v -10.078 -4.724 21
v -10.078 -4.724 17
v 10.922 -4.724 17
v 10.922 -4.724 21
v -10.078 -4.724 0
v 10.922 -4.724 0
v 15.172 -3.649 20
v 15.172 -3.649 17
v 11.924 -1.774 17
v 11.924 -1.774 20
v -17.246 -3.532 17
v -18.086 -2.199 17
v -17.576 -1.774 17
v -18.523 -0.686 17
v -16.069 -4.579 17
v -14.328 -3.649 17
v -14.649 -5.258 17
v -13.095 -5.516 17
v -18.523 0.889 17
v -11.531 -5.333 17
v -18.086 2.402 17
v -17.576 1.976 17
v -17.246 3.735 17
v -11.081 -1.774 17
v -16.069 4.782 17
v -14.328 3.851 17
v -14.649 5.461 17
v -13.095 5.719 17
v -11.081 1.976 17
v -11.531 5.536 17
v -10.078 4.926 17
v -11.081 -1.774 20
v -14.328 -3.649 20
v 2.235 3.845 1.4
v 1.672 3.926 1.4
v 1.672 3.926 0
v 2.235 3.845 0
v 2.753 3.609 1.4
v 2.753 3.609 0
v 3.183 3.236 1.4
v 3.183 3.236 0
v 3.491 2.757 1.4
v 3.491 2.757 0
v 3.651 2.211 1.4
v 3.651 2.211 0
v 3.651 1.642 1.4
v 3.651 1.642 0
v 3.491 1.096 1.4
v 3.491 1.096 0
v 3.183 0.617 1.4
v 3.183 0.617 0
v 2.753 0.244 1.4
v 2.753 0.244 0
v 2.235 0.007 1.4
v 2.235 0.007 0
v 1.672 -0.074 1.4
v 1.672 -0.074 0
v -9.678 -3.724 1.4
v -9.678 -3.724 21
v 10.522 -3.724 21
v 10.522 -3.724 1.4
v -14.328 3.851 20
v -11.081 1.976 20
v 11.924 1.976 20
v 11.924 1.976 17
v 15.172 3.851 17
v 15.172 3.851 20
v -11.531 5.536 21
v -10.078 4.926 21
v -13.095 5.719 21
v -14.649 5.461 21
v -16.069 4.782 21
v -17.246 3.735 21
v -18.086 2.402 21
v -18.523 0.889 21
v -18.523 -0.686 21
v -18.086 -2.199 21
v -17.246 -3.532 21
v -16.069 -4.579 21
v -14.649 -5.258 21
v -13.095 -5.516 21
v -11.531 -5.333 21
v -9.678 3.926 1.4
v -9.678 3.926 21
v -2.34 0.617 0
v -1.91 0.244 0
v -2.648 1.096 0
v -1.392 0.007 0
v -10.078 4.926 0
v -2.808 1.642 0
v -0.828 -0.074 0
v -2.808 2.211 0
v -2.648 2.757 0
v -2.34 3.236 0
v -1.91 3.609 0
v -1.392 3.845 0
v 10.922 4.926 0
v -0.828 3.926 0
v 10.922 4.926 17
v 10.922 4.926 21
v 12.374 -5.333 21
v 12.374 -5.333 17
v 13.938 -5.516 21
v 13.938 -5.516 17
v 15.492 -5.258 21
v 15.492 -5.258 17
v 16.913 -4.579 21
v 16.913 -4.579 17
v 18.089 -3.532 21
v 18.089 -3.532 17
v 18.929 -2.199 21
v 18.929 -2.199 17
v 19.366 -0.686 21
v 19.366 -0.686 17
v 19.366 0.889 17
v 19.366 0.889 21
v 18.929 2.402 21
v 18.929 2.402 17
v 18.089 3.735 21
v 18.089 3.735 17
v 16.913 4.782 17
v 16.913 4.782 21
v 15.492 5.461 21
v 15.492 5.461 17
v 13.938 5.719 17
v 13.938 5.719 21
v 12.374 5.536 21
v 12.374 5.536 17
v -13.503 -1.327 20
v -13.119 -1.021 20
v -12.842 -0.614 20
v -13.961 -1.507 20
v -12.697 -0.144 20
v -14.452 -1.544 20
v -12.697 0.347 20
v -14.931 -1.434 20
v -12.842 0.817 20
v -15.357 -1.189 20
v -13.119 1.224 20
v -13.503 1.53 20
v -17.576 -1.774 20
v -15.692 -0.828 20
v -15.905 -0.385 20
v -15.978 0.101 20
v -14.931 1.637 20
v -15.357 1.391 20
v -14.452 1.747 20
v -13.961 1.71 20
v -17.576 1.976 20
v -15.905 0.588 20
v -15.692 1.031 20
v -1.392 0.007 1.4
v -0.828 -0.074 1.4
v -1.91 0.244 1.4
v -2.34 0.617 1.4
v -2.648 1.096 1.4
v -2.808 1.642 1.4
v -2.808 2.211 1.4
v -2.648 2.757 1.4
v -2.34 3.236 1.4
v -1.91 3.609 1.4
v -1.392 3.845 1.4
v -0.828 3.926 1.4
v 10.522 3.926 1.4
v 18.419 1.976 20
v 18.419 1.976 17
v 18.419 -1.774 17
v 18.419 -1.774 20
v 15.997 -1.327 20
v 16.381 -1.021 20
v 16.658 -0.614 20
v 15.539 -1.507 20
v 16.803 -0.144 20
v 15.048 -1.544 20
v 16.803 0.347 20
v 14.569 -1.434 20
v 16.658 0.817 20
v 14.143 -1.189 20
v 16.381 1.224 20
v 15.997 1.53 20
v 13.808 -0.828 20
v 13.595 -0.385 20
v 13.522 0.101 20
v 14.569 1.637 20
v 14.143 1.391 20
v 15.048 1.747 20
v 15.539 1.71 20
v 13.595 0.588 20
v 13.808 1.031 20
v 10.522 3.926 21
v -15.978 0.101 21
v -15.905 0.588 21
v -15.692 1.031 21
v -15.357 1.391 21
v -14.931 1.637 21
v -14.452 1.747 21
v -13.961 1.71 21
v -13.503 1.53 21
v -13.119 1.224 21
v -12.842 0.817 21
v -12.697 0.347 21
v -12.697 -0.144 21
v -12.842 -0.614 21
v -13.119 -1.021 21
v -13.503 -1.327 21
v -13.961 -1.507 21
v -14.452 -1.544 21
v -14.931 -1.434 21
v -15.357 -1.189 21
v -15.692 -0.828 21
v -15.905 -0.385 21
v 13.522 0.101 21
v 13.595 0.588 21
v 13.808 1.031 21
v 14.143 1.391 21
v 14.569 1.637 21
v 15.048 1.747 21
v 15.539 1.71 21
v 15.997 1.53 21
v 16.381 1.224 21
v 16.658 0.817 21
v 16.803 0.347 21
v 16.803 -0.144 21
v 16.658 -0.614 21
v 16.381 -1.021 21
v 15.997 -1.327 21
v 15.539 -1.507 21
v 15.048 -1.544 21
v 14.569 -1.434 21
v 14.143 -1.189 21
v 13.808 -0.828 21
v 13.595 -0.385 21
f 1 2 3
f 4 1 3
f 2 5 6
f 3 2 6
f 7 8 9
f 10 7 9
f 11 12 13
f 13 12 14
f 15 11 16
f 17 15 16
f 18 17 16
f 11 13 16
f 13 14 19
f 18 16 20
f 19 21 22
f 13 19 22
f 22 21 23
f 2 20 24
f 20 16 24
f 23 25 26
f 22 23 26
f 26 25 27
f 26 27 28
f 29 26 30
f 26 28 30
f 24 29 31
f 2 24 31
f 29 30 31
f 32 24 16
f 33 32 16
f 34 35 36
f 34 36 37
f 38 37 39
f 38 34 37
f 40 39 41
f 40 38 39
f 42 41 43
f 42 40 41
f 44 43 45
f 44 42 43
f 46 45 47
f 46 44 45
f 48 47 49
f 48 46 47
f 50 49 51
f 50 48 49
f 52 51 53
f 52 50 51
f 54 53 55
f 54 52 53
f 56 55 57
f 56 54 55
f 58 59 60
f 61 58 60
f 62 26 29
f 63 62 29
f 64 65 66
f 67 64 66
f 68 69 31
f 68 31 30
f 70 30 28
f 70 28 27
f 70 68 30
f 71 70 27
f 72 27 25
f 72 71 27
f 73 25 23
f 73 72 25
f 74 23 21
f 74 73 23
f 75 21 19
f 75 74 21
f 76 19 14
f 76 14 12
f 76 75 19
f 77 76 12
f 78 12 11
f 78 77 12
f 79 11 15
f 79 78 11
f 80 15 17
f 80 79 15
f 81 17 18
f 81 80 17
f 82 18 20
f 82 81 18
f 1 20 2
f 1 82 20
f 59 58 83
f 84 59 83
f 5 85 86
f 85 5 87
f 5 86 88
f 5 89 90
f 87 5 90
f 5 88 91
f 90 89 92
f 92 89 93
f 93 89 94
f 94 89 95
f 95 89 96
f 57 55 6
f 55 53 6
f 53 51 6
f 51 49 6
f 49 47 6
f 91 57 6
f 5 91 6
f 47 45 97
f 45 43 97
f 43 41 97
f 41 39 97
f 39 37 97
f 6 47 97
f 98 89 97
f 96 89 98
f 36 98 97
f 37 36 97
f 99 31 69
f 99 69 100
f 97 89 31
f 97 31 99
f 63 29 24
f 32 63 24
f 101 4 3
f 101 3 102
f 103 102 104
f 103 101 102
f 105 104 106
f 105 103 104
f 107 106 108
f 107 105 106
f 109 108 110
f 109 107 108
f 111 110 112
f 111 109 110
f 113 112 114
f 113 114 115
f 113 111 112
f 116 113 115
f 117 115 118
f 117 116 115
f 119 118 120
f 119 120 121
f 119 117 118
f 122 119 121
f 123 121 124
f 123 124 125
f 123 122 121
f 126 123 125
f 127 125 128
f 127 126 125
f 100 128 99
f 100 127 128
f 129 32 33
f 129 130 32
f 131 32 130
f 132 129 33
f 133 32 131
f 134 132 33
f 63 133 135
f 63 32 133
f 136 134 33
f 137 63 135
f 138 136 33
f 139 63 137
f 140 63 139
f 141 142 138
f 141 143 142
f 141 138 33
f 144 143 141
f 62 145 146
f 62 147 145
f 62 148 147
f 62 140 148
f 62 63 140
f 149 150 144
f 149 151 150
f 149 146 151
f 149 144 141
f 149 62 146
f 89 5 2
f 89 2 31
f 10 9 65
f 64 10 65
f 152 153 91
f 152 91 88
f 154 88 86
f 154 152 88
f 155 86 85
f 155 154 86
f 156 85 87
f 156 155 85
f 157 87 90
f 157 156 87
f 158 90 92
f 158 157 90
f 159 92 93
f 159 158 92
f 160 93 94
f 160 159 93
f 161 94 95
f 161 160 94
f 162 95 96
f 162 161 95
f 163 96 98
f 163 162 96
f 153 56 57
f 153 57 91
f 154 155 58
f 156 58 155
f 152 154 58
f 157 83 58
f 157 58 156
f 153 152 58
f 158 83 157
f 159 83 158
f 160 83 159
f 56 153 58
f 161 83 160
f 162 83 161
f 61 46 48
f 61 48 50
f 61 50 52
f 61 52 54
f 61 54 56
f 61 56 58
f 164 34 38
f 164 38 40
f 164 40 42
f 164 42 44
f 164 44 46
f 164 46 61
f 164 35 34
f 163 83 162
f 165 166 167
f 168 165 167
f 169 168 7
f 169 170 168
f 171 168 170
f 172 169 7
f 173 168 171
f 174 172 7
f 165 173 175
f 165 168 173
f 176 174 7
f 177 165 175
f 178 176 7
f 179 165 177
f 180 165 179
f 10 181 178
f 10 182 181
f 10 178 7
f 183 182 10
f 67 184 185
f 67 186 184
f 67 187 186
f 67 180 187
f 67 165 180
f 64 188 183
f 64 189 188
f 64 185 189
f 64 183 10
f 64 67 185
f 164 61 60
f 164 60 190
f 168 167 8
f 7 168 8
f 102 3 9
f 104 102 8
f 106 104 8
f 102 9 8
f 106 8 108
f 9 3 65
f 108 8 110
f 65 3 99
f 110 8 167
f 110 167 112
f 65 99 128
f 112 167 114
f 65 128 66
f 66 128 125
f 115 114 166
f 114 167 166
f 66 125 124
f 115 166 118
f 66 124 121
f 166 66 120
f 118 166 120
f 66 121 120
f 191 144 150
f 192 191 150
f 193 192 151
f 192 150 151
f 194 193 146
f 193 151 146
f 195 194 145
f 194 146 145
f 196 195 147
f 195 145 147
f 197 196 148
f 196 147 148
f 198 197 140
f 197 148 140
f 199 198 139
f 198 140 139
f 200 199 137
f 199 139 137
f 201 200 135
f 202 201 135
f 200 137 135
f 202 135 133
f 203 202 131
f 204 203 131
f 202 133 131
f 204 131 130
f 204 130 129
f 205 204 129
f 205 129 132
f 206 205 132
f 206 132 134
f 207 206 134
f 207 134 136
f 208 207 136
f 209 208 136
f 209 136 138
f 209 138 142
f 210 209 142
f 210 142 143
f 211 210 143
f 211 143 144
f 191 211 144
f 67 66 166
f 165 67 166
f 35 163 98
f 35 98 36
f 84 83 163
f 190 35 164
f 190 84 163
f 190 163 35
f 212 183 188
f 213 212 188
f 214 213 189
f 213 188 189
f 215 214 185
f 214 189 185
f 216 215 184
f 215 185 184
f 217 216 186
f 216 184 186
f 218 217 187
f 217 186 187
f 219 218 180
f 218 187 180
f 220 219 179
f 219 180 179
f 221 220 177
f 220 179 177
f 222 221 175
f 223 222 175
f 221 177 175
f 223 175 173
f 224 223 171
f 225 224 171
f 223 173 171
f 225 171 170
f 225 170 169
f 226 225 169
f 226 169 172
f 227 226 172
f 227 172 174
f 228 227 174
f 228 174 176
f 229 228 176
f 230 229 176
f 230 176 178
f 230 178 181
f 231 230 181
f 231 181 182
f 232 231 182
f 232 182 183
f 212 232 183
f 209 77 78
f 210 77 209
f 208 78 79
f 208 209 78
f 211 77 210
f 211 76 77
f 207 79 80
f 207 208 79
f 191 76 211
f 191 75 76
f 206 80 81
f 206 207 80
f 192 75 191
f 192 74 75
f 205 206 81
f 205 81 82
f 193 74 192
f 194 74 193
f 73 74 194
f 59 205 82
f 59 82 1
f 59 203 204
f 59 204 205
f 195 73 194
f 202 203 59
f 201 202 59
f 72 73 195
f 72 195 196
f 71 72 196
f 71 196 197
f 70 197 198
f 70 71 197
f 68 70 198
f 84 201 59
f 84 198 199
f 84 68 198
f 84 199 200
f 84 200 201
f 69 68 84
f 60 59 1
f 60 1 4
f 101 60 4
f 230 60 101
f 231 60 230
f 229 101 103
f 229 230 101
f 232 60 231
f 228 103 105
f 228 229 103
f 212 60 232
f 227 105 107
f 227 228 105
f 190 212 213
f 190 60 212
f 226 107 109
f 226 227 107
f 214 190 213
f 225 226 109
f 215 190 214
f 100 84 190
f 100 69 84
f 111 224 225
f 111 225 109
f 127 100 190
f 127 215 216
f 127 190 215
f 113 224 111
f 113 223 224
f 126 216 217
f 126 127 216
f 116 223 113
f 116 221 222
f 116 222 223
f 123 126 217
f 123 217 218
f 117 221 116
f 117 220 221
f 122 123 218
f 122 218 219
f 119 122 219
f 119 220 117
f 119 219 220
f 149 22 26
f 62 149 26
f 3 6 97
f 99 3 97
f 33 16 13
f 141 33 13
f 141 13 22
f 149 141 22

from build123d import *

# Parameters (mm, degrees)
SKETCH1_W           = 21
SKETCH1_H           = 9.65
BOSS_EXTRUDE1_DEPTH = 21
SKETCH3_W           = 20.2
SKETCH3_H           = 7.65
CUT_EXTRUDE1_DEPTH  = 19.6
CUT_EXTRUDE2_DEPTH  = 19.6
BOSS_EXTRUDE2_DEPTH = 4
CUT_EXTRUDE3_DEPTH  = 3
SKETCH22_R          = 1.65
CUT_EXTRUDE4_DEPTH  = 3
BOSS_EXTRUDE3_DEPTH = 4
CUT_EXTRUDE5_DEPTH  = 3
SKETCH25_R          = 1.65
CUT_EXTRUDE6_DEPTH  = 3


with BuildPart() as part:
    # Sketch1 → Boss-Extrude1 (new body)
    with BuildSketch(Plane.XY):
        with Locations((0.42161215, 0.10146028)):
            Rectangle(SKETCH1_W, SKETCH1_H)
    extrude(amount=BOSS_EXTRUDE1_DEPTH)

    # Sketch3 → Cut-Extrude1 (cut)
    with BuildSketch(Plane.XY.offset(21)):
        with Locations((0.42161215, 0.10146028)):
            Rectangle(SKETCH3_W, SKETCH3_H)
    extrude(amount=-CUT_EXTRUDE1_DEPTH, mode=Mode.SUBTRACT)

    # Sketch5 → Cut-Extrude2 (cut)
    with BuildSketch(Plane.XY.offset(1.4)):
        with BuildLine():
            Line((-0.82838785, 3.92646028), (1.67161215, 3.92646028))
            ThreePointArc((1.67161215, 3.92646028), (3.67161215, 1.92646028), (1.67161215, -0.07353972))
            Line((1.67161215, -0.07353972), (-0.82838785, -0.07353972))
            ThreePointArc((-0.82838785, -0.07353972), (-2.82838785, 1.92646028), (-0.82838785, 3.92646028))
        make_face()
    extrude(amount=-CUT_EXTRUDE2_DEPTH, mode=Mode.SUBTRACT)

    # Sketch20 → Boss-Extrude2 (add)
    with BuildSketch(Plane.XY.offset(21)):
        with BuildLine():
            Line((-10.07838785, -4.72353972), (-10.07838785, 4.92646028))
            ThreePointArc((-10.07838785, 4.92646028), (-18.57838785, 0.10146028), (-10.07838785, -4.72353972))
        make_face()
    extrude(amount=-BOSS_EXTRUDE2_DEPTH)

    # Sketch21 → Cut-Extrude3 (cut)
    with BuildSketch(Plane(origin=(0, 0, 17), x_dir=(-1, 0, 0), z_dir=(0, 0, -1))):
        Polygon((14.32838785, 3.85146028), (11.080792586, 1.97646028), (11.080792586, -1.77353972), (14.32838785, -3.64853972), (17.575983115, -1.77353972), (17.575983115, 1.97646028), align=None)
    extrude(amount=-CUT_EXTRUDE3_DEPTH, mode=Mode.SUBTRACT)

    # Sketch22 → Cut-Extrude4 (cut)
    with BuildSketch(Plane(origin=(0, 0, 20), x_dir=(-1, 0, 0), z_dir=(0, 0, -1))):
        with Locations((14.32838785, 0.10146028)):
            Circle(SKETCH22_R)
    extrude(amount=-CUT_EXTRUDE4_DEPTH, mode=Mode.SUBTRACT)

    # Sketch23 → Boss-Extrude3 (add)
    with BuildSketch(Plane.XY.offset(21)):
        with BuildLine():
            Line((10.92161215, 4.92646028), (10.92161215, -4.72353972))
            ThreePointArc((10.92161215, -4.72353972), (19.42161215, 0.10146028), (10.92161215, 4.92646028))
        make_face()
    extrude(amount=-BOSS_EXTRUDE3_DEPTH)

    # Sketch24 → Cut-Extrude5 (cut)
    with BuildSketch(Plane(origin=(0, 0, 17), x_dir=(-1, 0, 0), z_dir=(0, 0, -1))):
        Polygon((-15.17161215, 3.85146028), (-18.419207414, 1.97646028), (-18.419207414, -1.77353972), (-15.17161215, -3.64853972), (-11.924016885, -1.77353972), (-11.924016885, 1.97646028), align=None)
    extrude(amount=-CUT_EXTRUDE5_DEPTH, mode=Mode.SUBTRACT)

    # Sketch25 → Cut-Extrude6 (cut)
    with BuildSketch(Plane(origin=(0, 0, 20), x_dir=(-1, 0, 0), z_dir=(0, 0, -1))):
        with Locations((-15.17161215, 0.10146028)):
            Circle(SKETCH25_R)
    extrude(amount=-CUT_EXTRUDE6_DEPTH, mode=Mode.SUBTRACT)


solid = part.part
